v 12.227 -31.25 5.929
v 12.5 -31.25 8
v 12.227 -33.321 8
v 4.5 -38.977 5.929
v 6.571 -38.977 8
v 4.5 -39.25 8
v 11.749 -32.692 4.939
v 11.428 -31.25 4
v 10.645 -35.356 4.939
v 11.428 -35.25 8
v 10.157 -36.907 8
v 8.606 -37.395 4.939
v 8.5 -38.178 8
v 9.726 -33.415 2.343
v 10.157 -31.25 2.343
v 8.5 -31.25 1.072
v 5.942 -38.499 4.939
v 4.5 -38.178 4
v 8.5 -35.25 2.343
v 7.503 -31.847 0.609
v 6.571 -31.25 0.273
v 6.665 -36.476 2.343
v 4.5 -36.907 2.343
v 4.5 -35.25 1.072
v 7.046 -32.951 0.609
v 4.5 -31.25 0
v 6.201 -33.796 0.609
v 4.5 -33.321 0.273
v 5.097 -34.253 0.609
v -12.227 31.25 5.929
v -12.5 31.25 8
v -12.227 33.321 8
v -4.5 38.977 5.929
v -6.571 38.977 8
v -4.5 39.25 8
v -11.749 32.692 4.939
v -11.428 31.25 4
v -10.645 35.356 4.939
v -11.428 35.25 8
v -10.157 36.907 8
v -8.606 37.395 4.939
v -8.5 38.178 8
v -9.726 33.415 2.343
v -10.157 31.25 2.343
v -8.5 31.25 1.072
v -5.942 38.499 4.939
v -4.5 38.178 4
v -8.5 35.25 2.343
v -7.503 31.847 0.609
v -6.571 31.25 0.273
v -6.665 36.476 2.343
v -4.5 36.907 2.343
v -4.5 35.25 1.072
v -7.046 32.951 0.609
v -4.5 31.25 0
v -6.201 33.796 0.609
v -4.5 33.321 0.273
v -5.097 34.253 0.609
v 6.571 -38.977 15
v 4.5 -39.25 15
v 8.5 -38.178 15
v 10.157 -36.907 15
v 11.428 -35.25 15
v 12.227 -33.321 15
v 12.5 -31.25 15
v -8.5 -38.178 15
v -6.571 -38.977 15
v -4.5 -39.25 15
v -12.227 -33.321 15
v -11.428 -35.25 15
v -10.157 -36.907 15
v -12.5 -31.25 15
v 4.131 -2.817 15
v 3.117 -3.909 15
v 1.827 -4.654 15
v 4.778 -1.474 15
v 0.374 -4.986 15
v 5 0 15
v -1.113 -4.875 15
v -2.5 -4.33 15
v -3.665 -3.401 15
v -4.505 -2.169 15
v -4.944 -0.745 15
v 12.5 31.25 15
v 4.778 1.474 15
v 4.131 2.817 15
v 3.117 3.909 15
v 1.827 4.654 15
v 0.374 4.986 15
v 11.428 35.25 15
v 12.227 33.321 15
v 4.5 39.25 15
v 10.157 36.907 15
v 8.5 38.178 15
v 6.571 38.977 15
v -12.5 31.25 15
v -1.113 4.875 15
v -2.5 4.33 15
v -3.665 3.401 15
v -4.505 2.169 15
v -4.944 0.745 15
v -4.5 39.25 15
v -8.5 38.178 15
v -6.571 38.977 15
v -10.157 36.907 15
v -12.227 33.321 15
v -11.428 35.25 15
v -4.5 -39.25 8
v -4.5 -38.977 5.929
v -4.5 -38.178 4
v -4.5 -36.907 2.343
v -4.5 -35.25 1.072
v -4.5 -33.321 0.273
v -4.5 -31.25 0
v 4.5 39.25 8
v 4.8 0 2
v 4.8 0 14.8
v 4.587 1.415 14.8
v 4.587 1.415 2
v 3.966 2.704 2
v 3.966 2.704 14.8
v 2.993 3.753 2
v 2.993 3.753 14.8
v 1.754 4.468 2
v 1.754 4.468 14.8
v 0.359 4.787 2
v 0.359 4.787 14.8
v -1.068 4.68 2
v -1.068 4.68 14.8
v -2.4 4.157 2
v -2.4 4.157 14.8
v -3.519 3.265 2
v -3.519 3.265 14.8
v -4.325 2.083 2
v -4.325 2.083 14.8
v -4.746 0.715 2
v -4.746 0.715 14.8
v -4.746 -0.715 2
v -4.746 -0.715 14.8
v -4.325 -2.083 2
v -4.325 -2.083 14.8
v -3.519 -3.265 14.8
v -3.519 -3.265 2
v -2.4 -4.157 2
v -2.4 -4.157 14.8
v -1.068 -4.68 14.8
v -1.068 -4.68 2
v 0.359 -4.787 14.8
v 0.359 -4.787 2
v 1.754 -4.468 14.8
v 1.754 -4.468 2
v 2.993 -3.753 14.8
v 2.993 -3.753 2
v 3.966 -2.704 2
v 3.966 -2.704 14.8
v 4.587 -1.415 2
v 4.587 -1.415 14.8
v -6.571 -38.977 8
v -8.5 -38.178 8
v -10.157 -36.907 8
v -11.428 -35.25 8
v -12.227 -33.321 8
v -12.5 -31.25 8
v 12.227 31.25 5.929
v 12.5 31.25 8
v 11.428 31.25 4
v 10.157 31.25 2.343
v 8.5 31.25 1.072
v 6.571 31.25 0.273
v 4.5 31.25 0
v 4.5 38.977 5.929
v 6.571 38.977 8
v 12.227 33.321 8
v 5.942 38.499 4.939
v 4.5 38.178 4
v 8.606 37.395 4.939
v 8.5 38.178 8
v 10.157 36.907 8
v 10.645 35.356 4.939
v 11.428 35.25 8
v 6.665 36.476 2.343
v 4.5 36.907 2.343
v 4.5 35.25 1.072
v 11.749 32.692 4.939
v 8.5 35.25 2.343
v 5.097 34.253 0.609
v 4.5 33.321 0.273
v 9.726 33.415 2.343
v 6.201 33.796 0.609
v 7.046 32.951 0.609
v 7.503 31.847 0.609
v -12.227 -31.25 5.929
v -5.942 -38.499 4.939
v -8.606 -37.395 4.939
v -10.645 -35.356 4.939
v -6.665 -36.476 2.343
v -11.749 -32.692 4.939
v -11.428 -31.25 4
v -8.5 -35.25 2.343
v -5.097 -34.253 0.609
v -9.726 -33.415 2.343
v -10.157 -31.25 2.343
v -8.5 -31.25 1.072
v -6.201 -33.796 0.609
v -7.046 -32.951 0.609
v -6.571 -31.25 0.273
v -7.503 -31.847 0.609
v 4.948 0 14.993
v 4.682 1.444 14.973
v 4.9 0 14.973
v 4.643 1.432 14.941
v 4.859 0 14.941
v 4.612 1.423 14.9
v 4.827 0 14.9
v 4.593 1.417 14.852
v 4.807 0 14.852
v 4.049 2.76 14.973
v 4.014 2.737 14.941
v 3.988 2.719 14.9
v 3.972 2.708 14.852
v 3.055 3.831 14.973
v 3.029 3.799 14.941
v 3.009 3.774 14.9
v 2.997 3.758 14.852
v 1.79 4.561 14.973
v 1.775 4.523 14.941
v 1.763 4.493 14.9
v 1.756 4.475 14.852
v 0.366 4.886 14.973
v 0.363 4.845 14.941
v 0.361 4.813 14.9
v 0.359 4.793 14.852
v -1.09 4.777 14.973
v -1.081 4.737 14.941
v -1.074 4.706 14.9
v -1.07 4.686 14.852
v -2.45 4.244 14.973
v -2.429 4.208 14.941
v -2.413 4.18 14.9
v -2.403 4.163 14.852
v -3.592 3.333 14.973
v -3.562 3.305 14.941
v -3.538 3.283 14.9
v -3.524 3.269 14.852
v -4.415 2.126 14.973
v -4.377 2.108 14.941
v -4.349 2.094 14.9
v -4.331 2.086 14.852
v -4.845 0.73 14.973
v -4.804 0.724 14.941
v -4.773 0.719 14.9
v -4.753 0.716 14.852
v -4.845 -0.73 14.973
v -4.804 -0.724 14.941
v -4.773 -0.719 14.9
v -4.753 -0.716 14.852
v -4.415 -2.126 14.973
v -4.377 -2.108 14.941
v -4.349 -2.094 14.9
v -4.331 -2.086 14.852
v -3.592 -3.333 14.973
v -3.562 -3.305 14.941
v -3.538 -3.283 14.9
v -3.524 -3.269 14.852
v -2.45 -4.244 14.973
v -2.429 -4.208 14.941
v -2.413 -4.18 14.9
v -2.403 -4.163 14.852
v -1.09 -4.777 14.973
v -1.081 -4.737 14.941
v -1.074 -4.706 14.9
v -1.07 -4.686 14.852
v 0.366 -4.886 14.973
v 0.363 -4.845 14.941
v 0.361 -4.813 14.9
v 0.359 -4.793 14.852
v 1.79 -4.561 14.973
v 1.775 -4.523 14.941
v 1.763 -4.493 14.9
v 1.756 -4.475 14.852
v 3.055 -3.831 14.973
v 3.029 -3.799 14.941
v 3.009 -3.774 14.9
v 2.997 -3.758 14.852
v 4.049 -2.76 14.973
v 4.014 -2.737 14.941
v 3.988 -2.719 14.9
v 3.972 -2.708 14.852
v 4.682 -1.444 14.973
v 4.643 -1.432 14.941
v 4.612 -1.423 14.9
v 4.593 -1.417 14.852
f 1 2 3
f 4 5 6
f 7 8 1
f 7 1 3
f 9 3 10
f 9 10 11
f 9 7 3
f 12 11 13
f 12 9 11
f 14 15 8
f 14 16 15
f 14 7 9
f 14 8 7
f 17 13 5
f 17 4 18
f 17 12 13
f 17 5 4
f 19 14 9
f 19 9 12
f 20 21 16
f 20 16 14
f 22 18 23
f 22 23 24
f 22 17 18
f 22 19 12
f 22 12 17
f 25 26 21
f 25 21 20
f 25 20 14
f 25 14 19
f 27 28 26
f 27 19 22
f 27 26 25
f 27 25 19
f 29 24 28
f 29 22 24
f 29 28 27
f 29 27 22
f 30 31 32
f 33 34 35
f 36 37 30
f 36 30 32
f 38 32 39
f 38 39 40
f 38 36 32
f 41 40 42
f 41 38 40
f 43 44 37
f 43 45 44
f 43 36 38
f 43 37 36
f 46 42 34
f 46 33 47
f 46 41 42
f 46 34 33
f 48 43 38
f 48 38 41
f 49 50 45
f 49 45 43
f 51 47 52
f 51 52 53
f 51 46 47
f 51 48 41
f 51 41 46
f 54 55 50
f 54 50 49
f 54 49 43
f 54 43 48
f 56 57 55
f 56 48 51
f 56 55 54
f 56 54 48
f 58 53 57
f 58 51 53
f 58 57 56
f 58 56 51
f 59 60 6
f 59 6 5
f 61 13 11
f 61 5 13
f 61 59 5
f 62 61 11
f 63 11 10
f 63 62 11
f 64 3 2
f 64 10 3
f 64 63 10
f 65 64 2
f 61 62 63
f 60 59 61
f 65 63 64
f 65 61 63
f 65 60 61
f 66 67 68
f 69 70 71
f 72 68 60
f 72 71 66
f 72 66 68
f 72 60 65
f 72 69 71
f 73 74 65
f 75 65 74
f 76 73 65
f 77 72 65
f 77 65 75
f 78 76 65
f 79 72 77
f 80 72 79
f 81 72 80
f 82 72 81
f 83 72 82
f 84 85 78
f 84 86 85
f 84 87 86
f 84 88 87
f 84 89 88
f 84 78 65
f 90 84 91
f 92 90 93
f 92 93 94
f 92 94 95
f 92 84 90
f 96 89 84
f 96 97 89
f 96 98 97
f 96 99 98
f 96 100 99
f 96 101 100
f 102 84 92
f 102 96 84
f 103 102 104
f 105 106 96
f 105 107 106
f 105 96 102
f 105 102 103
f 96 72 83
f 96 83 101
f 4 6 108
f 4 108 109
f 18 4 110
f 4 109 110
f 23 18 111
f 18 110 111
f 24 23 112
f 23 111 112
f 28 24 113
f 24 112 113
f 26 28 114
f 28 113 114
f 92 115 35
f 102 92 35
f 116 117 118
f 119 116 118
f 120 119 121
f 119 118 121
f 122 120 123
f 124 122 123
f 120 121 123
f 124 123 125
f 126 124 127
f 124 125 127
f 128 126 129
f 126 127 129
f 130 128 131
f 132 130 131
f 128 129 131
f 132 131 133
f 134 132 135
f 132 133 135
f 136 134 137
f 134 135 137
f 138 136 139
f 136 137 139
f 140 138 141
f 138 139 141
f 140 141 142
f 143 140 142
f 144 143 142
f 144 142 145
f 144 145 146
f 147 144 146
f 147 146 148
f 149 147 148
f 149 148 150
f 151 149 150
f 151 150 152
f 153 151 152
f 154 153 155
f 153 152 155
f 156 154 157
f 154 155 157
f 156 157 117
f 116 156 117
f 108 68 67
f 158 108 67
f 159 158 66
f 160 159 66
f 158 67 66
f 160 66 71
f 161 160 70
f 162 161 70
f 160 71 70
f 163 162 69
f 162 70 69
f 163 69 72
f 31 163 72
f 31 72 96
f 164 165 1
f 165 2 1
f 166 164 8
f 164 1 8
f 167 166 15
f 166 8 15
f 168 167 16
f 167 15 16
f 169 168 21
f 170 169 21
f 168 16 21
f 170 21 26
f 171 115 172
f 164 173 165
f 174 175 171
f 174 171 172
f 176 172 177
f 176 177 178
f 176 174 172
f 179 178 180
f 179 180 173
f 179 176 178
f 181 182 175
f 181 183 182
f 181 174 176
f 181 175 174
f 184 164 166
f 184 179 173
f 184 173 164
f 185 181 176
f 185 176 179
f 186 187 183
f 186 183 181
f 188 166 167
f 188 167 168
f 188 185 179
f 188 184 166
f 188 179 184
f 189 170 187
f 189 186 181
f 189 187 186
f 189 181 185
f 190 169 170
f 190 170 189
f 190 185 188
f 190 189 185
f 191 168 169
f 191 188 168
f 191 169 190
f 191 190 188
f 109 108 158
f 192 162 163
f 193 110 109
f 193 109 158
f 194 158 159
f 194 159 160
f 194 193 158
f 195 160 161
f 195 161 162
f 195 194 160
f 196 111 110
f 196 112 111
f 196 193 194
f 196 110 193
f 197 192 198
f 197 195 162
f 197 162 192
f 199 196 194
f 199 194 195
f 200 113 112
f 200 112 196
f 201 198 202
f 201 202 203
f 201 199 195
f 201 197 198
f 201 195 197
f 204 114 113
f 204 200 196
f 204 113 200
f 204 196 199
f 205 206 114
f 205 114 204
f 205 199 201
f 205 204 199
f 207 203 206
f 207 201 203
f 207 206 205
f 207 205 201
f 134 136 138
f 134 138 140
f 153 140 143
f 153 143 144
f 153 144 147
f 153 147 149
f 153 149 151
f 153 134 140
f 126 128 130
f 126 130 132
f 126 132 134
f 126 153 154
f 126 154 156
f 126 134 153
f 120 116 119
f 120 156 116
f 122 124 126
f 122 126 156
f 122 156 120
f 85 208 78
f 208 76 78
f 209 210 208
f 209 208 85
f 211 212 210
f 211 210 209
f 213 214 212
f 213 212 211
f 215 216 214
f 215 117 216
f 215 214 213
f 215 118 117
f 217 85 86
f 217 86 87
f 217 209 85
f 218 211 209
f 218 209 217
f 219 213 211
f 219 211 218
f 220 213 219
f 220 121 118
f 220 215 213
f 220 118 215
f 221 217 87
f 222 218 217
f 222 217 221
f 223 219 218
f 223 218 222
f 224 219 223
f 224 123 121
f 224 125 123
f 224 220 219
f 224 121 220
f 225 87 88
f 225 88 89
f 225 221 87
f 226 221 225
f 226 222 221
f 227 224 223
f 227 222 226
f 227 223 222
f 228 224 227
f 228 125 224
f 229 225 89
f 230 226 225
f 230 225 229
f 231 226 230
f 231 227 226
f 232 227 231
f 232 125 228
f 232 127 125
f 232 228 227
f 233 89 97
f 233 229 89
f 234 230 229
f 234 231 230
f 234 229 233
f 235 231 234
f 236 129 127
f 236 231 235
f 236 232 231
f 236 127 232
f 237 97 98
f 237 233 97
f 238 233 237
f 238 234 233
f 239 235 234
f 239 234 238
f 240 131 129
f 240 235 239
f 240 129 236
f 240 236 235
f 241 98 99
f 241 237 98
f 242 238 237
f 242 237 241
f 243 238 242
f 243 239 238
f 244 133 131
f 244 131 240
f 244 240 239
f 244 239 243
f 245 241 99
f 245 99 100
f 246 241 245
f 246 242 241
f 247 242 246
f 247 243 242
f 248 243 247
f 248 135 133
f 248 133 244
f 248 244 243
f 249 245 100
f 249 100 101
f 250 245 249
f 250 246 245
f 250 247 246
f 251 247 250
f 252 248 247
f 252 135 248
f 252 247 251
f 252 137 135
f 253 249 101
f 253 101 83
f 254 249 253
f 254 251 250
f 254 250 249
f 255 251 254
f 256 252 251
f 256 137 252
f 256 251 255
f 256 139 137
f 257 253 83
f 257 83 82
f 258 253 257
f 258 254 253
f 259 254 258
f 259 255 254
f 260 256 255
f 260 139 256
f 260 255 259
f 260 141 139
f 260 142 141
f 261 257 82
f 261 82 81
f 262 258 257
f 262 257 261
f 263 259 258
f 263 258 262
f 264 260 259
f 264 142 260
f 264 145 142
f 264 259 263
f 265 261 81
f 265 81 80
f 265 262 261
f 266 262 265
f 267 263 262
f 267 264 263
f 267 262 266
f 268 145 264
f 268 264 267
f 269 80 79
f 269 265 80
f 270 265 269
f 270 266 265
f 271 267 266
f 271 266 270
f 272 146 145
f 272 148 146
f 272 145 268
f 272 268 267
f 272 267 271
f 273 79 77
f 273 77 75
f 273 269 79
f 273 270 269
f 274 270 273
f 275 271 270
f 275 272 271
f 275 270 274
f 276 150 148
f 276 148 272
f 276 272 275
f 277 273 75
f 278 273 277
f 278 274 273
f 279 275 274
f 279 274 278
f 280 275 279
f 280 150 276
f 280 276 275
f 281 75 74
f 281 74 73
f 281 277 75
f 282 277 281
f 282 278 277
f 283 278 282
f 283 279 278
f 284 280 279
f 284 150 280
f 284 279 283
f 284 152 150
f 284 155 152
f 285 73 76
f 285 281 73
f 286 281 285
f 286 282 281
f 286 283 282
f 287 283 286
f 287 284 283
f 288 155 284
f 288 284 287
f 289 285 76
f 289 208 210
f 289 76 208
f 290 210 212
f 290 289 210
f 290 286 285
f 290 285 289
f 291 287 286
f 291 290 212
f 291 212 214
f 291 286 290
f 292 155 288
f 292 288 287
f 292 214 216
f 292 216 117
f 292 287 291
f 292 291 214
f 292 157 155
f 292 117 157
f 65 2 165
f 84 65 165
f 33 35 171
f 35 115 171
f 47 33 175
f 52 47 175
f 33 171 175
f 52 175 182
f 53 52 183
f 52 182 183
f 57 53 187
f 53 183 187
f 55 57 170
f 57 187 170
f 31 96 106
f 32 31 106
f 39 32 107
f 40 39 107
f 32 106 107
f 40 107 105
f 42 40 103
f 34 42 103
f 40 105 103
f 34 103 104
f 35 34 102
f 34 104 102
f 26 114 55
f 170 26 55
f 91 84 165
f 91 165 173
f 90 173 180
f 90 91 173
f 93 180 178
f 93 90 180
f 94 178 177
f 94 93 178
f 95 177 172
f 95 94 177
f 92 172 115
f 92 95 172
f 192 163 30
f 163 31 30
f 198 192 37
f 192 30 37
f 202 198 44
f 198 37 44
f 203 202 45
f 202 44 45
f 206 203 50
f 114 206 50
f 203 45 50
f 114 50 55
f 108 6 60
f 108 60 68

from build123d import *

# Parameters (mm, degrees)
SKETCH1_W           = 78.5
SKETCH1_H           = 25
BOSS_EXTRUDE1_DEPTH = 15
SKETCH2_R           = 4.8
CUT_EXTRUDE1_DEPTH  = 13
FILLET1_R           = 0.2
FILLET2_R           = 8
FILLET3_R           = 8


with BuildPart() as part:
    # Sketch1 → Boss-Extrude1 (new body)
    with BuildSketch(Plane(origin=(0, 0, 0), x_dir=(0, 1, 0), z_dir=(0, 0, 1))):
        Rectangle(SKETCH1_W, SKETCH1_H)
    extrude(amount=BOSS_EXTRUDE1_DEPTH)

    # Sketch2 → Cut-Extrude1 (cut)
    with BuildSketch(Plane.XY.offset(15)):
        Circle(SKETCH2_R)
    extrude(amount=-CUT_EXTRUDE1_DEPTH, mode=Mode.SUBTRACT)

    # Fillet1
    fillet1_edges = [part.edges().sort_by_distance(p)[0] for p in [
        (-4.8, 0, 15),
    ]]
    fillet(fillet1_edges, radius=FILLET1_R)

    # Fillet2
    fillet2_edges = [part.edges().sort_by_distance(p)[0] for p in [
        (12.5, 39.25, 7.5),
        (12.5, -39.25, 7.5),
        (-12.5, -39.25, 7.5),
        (-12.5, 39.25, 7.5),
    ]]
    fillet(fillet2_edges, radius=FILLET2_R)

    # Fillet3
    fillet3_edges = [part.edges().sort_by_distance(p)[0] for p in [
        (0, -39.25, 0),
        (0, 39.25, 0),
        (12.5, 0, 0),
        (-12.5, 0, 0),
        (-10.156854249, 36.906854249, 0),
        (10.156854249, 36.906854249, 0),
        (10.156854249, -36.906854249, 0),
        (-10.156854249, -36.906854249, 0),
    ]]
    fillet(fillet3_edges, radius=FILLET3_R)


solid = part.part
